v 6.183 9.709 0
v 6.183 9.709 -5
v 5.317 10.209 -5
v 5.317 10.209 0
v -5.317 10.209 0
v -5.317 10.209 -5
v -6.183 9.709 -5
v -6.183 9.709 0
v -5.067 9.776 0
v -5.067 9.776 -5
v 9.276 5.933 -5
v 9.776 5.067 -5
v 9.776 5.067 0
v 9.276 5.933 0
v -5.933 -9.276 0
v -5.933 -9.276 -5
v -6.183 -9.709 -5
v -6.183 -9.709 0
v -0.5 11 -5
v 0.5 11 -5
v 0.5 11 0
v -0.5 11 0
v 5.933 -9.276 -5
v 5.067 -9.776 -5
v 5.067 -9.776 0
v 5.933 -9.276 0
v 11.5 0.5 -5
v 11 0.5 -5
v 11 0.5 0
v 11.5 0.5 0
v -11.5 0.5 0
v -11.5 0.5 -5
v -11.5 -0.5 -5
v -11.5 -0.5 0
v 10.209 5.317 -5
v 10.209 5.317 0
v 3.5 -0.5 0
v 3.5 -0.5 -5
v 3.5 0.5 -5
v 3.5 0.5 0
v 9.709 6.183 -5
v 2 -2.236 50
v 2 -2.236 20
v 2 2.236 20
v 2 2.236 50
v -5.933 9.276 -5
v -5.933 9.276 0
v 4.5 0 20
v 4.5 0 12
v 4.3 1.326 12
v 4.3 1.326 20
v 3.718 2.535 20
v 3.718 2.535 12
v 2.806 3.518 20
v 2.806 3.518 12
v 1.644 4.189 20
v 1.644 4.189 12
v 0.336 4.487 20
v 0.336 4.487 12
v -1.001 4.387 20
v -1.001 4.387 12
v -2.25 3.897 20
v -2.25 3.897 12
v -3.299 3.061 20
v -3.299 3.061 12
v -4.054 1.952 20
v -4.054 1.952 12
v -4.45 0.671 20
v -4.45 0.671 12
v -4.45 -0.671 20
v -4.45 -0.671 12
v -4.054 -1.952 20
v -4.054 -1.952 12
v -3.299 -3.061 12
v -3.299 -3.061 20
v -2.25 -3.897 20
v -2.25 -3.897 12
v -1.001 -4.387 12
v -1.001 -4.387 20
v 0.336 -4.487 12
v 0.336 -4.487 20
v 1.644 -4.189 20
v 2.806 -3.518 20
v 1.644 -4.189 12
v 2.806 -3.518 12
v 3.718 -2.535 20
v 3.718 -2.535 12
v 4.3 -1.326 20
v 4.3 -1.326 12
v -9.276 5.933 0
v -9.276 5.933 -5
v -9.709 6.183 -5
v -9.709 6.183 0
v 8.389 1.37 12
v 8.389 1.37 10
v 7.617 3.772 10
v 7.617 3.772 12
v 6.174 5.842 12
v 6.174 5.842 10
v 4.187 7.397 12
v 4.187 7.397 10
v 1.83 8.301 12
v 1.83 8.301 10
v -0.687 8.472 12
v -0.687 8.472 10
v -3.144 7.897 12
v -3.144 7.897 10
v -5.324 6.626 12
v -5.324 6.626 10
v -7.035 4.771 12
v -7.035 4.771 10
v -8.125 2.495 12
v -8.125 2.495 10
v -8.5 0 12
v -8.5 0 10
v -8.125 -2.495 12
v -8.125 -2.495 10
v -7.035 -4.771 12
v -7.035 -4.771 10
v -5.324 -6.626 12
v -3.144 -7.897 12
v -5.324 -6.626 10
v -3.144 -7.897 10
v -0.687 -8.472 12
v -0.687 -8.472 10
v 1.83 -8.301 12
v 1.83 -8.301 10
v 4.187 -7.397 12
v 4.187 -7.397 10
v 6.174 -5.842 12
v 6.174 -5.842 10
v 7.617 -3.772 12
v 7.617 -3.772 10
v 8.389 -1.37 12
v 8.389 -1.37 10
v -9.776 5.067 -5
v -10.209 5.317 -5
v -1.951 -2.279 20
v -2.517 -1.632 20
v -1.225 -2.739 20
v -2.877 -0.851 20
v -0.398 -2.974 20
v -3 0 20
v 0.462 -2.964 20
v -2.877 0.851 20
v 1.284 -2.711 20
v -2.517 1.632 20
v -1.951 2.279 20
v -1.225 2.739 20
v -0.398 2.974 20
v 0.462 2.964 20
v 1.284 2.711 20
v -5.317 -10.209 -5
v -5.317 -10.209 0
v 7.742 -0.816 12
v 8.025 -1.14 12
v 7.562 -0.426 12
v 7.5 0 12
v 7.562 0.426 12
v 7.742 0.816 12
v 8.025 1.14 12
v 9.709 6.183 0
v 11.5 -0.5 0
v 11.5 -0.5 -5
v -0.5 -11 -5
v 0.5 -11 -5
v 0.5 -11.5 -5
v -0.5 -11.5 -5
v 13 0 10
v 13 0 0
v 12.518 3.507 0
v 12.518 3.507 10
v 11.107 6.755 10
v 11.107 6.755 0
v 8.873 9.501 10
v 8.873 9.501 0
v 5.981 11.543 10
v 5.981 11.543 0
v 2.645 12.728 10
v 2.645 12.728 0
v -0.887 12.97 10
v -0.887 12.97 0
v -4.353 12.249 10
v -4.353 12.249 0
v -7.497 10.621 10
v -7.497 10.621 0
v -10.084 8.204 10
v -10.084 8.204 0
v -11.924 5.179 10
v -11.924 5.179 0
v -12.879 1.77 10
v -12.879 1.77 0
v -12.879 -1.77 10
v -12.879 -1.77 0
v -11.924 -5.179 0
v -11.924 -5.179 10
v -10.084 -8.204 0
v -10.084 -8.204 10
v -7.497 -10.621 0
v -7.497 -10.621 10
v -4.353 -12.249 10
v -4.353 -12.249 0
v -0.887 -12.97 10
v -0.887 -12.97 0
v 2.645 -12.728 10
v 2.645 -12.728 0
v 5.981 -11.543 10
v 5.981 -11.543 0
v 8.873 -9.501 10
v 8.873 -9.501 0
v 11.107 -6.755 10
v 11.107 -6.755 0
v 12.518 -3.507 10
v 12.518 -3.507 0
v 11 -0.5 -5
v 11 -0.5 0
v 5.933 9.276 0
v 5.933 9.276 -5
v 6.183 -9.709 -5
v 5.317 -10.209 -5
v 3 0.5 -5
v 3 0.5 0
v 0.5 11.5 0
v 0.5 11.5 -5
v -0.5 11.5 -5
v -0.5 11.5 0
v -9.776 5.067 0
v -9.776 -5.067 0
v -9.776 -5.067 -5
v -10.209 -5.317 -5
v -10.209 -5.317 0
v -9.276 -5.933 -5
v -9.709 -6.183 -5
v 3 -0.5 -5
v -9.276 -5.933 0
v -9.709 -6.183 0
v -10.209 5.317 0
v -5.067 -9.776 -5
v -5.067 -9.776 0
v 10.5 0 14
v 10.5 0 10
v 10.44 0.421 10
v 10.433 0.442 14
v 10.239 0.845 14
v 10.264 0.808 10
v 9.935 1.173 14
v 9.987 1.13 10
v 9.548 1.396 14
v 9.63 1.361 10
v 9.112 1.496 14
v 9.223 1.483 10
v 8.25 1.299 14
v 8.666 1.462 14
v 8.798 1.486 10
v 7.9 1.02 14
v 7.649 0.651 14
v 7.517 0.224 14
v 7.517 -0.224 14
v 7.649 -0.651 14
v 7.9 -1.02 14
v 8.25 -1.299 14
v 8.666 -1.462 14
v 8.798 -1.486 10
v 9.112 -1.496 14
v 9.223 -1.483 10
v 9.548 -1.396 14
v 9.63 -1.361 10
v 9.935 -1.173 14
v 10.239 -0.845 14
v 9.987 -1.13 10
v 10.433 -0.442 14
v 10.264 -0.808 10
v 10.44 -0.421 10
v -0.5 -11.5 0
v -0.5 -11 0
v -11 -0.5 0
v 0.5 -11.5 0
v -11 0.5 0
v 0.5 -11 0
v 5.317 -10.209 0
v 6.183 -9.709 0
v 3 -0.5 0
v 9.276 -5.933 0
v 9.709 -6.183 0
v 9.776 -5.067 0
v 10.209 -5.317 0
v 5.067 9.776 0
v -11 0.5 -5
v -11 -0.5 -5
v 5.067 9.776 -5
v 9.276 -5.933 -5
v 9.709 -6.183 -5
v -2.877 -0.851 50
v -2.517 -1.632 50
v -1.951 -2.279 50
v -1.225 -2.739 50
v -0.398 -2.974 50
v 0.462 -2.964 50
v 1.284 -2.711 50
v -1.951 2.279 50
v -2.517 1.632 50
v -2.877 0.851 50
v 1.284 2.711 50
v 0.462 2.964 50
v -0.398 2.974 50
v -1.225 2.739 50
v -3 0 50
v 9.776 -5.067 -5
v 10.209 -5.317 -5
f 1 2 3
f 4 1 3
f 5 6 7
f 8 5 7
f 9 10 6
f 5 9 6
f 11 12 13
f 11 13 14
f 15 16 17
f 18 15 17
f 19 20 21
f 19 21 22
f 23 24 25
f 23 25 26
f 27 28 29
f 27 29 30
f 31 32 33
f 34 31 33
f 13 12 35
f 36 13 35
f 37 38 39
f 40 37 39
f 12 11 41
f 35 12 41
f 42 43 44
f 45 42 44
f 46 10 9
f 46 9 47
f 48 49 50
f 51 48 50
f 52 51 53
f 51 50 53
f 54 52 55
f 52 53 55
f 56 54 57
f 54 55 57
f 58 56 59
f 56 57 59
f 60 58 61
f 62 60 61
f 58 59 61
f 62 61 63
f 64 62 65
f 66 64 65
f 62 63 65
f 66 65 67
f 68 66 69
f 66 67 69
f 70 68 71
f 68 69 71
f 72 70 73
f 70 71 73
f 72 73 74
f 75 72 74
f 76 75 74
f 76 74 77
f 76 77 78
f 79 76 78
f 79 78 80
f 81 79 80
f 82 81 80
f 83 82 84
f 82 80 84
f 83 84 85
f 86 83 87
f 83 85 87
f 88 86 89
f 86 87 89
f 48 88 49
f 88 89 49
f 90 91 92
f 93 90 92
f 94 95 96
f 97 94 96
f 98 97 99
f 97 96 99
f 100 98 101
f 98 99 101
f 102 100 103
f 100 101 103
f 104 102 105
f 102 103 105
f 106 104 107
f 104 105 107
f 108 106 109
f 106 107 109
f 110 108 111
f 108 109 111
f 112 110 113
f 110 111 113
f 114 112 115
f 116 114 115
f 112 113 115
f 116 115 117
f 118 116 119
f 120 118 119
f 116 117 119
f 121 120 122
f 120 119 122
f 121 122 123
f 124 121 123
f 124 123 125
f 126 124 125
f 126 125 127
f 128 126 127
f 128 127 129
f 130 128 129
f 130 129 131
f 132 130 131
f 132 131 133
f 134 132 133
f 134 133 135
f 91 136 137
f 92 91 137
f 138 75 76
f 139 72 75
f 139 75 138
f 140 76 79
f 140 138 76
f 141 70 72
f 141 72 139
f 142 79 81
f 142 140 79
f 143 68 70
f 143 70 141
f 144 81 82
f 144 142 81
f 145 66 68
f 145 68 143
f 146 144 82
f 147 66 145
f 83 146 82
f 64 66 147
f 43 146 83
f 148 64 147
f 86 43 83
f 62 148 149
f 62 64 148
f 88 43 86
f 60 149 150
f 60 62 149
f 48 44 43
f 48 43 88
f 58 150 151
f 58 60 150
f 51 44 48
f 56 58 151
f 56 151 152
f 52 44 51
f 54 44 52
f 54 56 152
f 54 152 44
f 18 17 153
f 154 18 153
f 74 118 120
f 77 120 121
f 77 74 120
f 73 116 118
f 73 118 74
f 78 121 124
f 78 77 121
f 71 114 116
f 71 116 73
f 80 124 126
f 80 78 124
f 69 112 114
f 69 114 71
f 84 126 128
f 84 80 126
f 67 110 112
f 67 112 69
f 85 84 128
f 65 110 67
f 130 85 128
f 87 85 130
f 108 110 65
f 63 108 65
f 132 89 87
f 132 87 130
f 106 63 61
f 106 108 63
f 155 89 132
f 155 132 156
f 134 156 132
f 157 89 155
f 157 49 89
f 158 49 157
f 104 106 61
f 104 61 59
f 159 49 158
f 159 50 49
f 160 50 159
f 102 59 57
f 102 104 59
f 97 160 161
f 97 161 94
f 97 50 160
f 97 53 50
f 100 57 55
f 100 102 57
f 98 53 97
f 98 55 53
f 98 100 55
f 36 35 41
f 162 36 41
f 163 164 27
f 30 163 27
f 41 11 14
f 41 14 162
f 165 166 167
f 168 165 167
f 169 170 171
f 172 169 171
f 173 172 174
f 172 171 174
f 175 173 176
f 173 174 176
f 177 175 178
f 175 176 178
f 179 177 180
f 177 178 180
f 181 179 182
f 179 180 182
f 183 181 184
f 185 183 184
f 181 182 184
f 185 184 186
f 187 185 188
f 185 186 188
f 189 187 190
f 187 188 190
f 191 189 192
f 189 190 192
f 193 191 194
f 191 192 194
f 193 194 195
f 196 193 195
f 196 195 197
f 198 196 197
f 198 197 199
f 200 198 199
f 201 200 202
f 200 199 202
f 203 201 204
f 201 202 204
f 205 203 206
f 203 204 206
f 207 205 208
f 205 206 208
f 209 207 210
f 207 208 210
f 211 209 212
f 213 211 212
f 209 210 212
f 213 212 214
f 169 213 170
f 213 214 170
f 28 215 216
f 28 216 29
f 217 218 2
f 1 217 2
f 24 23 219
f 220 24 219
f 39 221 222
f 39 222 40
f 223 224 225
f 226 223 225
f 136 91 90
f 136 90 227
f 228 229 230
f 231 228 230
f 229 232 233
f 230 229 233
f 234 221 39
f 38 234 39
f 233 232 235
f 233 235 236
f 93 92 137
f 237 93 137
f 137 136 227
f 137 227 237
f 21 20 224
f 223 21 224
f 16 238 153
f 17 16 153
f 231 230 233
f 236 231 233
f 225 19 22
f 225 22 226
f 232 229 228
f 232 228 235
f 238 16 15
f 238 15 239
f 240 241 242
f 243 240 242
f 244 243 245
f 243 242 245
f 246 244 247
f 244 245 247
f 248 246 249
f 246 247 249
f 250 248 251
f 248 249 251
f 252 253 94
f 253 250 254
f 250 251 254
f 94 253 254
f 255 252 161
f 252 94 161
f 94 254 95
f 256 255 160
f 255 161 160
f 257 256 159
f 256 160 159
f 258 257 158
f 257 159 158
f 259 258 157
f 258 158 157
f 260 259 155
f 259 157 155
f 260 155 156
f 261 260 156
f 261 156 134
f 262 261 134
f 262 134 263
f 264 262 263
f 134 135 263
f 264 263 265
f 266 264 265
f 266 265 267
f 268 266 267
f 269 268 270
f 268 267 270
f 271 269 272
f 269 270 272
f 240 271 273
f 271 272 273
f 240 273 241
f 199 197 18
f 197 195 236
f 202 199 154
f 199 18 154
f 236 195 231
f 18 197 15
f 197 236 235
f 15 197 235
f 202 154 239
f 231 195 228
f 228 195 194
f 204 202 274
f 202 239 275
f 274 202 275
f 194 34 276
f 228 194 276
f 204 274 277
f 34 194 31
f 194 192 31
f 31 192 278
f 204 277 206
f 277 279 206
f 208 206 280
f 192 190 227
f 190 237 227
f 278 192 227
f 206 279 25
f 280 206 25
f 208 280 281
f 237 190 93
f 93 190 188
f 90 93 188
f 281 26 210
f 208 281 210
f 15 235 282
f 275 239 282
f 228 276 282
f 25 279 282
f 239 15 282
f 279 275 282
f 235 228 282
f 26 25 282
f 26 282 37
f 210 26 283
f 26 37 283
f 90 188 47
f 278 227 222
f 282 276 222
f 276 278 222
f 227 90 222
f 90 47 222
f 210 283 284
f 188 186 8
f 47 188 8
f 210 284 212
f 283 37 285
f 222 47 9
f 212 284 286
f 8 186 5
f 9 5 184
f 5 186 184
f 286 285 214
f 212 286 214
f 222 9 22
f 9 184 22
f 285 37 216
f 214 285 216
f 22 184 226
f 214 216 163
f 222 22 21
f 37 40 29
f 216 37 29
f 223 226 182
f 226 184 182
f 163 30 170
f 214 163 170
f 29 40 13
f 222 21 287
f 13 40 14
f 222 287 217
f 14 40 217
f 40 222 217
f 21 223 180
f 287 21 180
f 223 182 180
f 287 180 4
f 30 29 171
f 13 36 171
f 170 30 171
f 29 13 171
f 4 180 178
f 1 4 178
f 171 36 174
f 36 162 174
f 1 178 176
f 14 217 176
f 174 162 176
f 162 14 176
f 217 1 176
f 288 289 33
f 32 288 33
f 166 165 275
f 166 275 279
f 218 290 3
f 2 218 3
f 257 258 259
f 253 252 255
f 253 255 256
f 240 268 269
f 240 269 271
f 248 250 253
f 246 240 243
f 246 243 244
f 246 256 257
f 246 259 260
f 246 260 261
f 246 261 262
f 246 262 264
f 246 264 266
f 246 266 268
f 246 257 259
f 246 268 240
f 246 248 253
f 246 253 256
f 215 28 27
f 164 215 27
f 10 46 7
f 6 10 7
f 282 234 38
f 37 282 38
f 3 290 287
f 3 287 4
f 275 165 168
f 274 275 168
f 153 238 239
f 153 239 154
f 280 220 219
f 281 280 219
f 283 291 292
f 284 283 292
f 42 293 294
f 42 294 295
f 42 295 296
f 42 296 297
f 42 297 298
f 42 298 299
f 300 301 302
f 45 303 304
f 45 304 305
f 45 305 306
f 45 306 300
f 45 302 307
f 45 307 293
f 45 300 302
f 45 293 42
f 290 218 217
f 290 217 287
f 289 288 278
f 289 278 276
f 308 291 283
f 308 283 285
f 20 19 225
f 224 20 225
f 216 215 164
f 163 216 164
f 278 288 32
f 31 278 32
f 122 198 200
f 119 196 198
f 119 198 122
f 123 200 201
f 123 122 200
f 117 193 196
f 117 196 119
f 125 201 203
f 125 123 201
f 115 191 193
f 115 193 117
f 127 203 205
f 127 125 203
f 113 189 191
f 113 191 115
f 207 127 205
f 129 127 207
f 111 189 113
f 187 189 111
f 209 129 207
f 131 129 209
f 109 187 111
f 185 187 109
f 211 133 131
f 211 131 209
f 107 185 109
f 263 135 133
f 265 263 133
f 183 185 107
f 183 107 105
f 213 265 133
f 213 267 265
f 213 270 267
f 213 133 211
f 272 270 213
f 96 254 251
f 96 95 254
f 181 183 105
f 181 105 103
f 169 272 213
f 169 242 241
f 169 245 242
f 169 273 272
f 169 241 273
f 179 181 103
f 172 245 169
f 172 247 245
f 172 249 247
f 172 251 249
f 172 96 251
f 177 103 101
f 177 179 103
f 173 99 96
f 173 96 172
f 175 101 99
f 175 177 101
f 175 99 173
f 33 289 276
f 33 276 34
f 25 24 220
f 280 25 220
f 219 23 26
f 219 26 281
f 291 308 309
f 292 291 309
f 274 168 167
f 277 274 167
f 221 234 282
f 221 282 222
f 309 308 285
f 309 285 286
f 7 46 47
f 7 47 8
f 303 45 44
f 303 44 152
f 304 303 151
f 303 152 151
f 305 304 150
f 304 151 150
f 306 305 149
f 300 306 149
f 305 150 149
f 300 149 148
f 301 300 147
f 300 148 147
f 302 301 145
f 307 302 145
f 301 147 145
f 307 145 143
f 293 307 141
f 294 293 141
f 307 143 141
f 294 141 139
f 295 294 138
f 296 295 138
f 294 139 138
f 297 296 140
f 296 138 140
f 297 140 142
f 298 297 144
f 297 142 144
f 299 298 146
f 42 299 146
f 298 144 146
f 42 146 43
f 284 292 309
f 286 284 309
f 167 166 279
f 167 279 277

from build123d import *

# Parameters (mm, degrees)
CYLINDER001_R     = 8.5
CYLINDER001_DEPTH = 2
BOX_W             = 0.5
BOX_H             = 1
BOX_DEPTH         = 5
ARRAY_COUNT       = 12
BOX001_W          = 0.5
BOX001_H          = 1
BOX001_DEPTH      = 5
CYLINDER002_R     = 4.5
CYLINDER002_DEPTH = 8
CYLINDER004_R     = 1.5
CYLINDER004_DEPTH = 4
BOX002_W          = 1
BOX002_H          = 10
BOX002_DEPTH      = 30
CYLINDER003_R     = 3
CYLINDER003_DEPTH = 30
CYLINDER_R        = 13
CYLINDER_DEPTH    = 10


with BuildPart() as cylinder001:
    # Cylinder001 → Cylinder001 (new body)
    with BuildSketch(Plane.XY.offset(10)):
        Circle(CYLINDER001_R)
    extrude(amount=CYLINDER001_DEPTH)


with BuildPart() as pin_array:
    # Box → Box (new body)
    with BuildSketch(Plane(origin=(11, -0.5, -5), x_dir=(1, 0, 0), z_dir=(0, 0, 1))):
        with Locations((0.25, 0.5)):
            Rectangle(BOX_W, BOX_H)
    extrude(amount=BOX_DEPTH)

    # Array: Pin array ×12 about axis
    array_axis = Axis((0, 0, 0), (0, 0, 1))


with BuildPart() as pin_array_1:
    add(pin_array.part)
    for i in range(1, ARRAY_COUNT):
        add(pin_array.part.rotate(array_axis, i * 360 / ARRAY_COUNT))


with BuildPart() as pin_central:
    # Box001 → Box001 (new body)
    with BuildSketch(Plane(origin=(3, -0.5, -5), x_dir=(1, 0, 0), z_dir=(0, 0, 1))):
        with Locations((0.25, 0.5)):
            Rectangle(BOX001_W, BOX001_H)
    extrude(amount=BOX001_DEPTH)


with BuildPart() as cylinder002:
    # Cylinder002 → Cylinder002 (new body)
    with BuildSketch(Plane.XY.offset(12)):
        Circle(CYLINDER002_R)
    extrude(amount=CYLINDER002_DEPTH)


with BuildPart() as cylinder004:
    # Cylinder004 → Cylinder004 (new body)
    with BuildSketch(Plane(origin=(9, 0, 10), x_dir=(1, 0, 0), z_dir=(0, 0, 1))):
        Circle(CYLINDER004_R)
    extrude(amount=CYLINDER004_DEPTH)


with BuildPart() as recorte:
    # Box002 → Box002 (new body)
    with BuildSketch(Plane(origin=(2, -5, 20), x_dir=(1, 0, 0), z_dir=(0, 0, 1))):
        with Locations((0.5, 5)):
            Rectangle(BOX002_W, BOX002_H)
    extrude(amount=BOX002_DEPTH)


with BuildPart() as cuerpo_4_recortado:
    # Cylinder003 → Cylinder003 (new body)
    with BuildSketch(Plane.XY.offset(20)):
        Circle(CYLINDER003_R)
    extrude(amount=CYLINDER003_DEPTH)

    # Cut: cut Recorte
    add(recorte.part, mode=Mode.SUBTRACT)


with BuildPart() as selector_final:
    # Cylinder → Cylinder (new body)
    with BuildSketch(Plane.XY):
        Circle(CYLINDER_R)
    extrude(amount=CYLINDER_DEPTH)

    # Fusion: union Cylinder001, Pin array, Pin central, Cylinder002, Cylinder004, Cuerpo 4 recortado
    add(cylinder001.part)
    add(pin_array_1.part)
    add(pin_central.part)
    add(cylinder002.part)
    add(cylinder004.part)
    add(cuerpo_4_recortado.part)


solid = selector_final.part
